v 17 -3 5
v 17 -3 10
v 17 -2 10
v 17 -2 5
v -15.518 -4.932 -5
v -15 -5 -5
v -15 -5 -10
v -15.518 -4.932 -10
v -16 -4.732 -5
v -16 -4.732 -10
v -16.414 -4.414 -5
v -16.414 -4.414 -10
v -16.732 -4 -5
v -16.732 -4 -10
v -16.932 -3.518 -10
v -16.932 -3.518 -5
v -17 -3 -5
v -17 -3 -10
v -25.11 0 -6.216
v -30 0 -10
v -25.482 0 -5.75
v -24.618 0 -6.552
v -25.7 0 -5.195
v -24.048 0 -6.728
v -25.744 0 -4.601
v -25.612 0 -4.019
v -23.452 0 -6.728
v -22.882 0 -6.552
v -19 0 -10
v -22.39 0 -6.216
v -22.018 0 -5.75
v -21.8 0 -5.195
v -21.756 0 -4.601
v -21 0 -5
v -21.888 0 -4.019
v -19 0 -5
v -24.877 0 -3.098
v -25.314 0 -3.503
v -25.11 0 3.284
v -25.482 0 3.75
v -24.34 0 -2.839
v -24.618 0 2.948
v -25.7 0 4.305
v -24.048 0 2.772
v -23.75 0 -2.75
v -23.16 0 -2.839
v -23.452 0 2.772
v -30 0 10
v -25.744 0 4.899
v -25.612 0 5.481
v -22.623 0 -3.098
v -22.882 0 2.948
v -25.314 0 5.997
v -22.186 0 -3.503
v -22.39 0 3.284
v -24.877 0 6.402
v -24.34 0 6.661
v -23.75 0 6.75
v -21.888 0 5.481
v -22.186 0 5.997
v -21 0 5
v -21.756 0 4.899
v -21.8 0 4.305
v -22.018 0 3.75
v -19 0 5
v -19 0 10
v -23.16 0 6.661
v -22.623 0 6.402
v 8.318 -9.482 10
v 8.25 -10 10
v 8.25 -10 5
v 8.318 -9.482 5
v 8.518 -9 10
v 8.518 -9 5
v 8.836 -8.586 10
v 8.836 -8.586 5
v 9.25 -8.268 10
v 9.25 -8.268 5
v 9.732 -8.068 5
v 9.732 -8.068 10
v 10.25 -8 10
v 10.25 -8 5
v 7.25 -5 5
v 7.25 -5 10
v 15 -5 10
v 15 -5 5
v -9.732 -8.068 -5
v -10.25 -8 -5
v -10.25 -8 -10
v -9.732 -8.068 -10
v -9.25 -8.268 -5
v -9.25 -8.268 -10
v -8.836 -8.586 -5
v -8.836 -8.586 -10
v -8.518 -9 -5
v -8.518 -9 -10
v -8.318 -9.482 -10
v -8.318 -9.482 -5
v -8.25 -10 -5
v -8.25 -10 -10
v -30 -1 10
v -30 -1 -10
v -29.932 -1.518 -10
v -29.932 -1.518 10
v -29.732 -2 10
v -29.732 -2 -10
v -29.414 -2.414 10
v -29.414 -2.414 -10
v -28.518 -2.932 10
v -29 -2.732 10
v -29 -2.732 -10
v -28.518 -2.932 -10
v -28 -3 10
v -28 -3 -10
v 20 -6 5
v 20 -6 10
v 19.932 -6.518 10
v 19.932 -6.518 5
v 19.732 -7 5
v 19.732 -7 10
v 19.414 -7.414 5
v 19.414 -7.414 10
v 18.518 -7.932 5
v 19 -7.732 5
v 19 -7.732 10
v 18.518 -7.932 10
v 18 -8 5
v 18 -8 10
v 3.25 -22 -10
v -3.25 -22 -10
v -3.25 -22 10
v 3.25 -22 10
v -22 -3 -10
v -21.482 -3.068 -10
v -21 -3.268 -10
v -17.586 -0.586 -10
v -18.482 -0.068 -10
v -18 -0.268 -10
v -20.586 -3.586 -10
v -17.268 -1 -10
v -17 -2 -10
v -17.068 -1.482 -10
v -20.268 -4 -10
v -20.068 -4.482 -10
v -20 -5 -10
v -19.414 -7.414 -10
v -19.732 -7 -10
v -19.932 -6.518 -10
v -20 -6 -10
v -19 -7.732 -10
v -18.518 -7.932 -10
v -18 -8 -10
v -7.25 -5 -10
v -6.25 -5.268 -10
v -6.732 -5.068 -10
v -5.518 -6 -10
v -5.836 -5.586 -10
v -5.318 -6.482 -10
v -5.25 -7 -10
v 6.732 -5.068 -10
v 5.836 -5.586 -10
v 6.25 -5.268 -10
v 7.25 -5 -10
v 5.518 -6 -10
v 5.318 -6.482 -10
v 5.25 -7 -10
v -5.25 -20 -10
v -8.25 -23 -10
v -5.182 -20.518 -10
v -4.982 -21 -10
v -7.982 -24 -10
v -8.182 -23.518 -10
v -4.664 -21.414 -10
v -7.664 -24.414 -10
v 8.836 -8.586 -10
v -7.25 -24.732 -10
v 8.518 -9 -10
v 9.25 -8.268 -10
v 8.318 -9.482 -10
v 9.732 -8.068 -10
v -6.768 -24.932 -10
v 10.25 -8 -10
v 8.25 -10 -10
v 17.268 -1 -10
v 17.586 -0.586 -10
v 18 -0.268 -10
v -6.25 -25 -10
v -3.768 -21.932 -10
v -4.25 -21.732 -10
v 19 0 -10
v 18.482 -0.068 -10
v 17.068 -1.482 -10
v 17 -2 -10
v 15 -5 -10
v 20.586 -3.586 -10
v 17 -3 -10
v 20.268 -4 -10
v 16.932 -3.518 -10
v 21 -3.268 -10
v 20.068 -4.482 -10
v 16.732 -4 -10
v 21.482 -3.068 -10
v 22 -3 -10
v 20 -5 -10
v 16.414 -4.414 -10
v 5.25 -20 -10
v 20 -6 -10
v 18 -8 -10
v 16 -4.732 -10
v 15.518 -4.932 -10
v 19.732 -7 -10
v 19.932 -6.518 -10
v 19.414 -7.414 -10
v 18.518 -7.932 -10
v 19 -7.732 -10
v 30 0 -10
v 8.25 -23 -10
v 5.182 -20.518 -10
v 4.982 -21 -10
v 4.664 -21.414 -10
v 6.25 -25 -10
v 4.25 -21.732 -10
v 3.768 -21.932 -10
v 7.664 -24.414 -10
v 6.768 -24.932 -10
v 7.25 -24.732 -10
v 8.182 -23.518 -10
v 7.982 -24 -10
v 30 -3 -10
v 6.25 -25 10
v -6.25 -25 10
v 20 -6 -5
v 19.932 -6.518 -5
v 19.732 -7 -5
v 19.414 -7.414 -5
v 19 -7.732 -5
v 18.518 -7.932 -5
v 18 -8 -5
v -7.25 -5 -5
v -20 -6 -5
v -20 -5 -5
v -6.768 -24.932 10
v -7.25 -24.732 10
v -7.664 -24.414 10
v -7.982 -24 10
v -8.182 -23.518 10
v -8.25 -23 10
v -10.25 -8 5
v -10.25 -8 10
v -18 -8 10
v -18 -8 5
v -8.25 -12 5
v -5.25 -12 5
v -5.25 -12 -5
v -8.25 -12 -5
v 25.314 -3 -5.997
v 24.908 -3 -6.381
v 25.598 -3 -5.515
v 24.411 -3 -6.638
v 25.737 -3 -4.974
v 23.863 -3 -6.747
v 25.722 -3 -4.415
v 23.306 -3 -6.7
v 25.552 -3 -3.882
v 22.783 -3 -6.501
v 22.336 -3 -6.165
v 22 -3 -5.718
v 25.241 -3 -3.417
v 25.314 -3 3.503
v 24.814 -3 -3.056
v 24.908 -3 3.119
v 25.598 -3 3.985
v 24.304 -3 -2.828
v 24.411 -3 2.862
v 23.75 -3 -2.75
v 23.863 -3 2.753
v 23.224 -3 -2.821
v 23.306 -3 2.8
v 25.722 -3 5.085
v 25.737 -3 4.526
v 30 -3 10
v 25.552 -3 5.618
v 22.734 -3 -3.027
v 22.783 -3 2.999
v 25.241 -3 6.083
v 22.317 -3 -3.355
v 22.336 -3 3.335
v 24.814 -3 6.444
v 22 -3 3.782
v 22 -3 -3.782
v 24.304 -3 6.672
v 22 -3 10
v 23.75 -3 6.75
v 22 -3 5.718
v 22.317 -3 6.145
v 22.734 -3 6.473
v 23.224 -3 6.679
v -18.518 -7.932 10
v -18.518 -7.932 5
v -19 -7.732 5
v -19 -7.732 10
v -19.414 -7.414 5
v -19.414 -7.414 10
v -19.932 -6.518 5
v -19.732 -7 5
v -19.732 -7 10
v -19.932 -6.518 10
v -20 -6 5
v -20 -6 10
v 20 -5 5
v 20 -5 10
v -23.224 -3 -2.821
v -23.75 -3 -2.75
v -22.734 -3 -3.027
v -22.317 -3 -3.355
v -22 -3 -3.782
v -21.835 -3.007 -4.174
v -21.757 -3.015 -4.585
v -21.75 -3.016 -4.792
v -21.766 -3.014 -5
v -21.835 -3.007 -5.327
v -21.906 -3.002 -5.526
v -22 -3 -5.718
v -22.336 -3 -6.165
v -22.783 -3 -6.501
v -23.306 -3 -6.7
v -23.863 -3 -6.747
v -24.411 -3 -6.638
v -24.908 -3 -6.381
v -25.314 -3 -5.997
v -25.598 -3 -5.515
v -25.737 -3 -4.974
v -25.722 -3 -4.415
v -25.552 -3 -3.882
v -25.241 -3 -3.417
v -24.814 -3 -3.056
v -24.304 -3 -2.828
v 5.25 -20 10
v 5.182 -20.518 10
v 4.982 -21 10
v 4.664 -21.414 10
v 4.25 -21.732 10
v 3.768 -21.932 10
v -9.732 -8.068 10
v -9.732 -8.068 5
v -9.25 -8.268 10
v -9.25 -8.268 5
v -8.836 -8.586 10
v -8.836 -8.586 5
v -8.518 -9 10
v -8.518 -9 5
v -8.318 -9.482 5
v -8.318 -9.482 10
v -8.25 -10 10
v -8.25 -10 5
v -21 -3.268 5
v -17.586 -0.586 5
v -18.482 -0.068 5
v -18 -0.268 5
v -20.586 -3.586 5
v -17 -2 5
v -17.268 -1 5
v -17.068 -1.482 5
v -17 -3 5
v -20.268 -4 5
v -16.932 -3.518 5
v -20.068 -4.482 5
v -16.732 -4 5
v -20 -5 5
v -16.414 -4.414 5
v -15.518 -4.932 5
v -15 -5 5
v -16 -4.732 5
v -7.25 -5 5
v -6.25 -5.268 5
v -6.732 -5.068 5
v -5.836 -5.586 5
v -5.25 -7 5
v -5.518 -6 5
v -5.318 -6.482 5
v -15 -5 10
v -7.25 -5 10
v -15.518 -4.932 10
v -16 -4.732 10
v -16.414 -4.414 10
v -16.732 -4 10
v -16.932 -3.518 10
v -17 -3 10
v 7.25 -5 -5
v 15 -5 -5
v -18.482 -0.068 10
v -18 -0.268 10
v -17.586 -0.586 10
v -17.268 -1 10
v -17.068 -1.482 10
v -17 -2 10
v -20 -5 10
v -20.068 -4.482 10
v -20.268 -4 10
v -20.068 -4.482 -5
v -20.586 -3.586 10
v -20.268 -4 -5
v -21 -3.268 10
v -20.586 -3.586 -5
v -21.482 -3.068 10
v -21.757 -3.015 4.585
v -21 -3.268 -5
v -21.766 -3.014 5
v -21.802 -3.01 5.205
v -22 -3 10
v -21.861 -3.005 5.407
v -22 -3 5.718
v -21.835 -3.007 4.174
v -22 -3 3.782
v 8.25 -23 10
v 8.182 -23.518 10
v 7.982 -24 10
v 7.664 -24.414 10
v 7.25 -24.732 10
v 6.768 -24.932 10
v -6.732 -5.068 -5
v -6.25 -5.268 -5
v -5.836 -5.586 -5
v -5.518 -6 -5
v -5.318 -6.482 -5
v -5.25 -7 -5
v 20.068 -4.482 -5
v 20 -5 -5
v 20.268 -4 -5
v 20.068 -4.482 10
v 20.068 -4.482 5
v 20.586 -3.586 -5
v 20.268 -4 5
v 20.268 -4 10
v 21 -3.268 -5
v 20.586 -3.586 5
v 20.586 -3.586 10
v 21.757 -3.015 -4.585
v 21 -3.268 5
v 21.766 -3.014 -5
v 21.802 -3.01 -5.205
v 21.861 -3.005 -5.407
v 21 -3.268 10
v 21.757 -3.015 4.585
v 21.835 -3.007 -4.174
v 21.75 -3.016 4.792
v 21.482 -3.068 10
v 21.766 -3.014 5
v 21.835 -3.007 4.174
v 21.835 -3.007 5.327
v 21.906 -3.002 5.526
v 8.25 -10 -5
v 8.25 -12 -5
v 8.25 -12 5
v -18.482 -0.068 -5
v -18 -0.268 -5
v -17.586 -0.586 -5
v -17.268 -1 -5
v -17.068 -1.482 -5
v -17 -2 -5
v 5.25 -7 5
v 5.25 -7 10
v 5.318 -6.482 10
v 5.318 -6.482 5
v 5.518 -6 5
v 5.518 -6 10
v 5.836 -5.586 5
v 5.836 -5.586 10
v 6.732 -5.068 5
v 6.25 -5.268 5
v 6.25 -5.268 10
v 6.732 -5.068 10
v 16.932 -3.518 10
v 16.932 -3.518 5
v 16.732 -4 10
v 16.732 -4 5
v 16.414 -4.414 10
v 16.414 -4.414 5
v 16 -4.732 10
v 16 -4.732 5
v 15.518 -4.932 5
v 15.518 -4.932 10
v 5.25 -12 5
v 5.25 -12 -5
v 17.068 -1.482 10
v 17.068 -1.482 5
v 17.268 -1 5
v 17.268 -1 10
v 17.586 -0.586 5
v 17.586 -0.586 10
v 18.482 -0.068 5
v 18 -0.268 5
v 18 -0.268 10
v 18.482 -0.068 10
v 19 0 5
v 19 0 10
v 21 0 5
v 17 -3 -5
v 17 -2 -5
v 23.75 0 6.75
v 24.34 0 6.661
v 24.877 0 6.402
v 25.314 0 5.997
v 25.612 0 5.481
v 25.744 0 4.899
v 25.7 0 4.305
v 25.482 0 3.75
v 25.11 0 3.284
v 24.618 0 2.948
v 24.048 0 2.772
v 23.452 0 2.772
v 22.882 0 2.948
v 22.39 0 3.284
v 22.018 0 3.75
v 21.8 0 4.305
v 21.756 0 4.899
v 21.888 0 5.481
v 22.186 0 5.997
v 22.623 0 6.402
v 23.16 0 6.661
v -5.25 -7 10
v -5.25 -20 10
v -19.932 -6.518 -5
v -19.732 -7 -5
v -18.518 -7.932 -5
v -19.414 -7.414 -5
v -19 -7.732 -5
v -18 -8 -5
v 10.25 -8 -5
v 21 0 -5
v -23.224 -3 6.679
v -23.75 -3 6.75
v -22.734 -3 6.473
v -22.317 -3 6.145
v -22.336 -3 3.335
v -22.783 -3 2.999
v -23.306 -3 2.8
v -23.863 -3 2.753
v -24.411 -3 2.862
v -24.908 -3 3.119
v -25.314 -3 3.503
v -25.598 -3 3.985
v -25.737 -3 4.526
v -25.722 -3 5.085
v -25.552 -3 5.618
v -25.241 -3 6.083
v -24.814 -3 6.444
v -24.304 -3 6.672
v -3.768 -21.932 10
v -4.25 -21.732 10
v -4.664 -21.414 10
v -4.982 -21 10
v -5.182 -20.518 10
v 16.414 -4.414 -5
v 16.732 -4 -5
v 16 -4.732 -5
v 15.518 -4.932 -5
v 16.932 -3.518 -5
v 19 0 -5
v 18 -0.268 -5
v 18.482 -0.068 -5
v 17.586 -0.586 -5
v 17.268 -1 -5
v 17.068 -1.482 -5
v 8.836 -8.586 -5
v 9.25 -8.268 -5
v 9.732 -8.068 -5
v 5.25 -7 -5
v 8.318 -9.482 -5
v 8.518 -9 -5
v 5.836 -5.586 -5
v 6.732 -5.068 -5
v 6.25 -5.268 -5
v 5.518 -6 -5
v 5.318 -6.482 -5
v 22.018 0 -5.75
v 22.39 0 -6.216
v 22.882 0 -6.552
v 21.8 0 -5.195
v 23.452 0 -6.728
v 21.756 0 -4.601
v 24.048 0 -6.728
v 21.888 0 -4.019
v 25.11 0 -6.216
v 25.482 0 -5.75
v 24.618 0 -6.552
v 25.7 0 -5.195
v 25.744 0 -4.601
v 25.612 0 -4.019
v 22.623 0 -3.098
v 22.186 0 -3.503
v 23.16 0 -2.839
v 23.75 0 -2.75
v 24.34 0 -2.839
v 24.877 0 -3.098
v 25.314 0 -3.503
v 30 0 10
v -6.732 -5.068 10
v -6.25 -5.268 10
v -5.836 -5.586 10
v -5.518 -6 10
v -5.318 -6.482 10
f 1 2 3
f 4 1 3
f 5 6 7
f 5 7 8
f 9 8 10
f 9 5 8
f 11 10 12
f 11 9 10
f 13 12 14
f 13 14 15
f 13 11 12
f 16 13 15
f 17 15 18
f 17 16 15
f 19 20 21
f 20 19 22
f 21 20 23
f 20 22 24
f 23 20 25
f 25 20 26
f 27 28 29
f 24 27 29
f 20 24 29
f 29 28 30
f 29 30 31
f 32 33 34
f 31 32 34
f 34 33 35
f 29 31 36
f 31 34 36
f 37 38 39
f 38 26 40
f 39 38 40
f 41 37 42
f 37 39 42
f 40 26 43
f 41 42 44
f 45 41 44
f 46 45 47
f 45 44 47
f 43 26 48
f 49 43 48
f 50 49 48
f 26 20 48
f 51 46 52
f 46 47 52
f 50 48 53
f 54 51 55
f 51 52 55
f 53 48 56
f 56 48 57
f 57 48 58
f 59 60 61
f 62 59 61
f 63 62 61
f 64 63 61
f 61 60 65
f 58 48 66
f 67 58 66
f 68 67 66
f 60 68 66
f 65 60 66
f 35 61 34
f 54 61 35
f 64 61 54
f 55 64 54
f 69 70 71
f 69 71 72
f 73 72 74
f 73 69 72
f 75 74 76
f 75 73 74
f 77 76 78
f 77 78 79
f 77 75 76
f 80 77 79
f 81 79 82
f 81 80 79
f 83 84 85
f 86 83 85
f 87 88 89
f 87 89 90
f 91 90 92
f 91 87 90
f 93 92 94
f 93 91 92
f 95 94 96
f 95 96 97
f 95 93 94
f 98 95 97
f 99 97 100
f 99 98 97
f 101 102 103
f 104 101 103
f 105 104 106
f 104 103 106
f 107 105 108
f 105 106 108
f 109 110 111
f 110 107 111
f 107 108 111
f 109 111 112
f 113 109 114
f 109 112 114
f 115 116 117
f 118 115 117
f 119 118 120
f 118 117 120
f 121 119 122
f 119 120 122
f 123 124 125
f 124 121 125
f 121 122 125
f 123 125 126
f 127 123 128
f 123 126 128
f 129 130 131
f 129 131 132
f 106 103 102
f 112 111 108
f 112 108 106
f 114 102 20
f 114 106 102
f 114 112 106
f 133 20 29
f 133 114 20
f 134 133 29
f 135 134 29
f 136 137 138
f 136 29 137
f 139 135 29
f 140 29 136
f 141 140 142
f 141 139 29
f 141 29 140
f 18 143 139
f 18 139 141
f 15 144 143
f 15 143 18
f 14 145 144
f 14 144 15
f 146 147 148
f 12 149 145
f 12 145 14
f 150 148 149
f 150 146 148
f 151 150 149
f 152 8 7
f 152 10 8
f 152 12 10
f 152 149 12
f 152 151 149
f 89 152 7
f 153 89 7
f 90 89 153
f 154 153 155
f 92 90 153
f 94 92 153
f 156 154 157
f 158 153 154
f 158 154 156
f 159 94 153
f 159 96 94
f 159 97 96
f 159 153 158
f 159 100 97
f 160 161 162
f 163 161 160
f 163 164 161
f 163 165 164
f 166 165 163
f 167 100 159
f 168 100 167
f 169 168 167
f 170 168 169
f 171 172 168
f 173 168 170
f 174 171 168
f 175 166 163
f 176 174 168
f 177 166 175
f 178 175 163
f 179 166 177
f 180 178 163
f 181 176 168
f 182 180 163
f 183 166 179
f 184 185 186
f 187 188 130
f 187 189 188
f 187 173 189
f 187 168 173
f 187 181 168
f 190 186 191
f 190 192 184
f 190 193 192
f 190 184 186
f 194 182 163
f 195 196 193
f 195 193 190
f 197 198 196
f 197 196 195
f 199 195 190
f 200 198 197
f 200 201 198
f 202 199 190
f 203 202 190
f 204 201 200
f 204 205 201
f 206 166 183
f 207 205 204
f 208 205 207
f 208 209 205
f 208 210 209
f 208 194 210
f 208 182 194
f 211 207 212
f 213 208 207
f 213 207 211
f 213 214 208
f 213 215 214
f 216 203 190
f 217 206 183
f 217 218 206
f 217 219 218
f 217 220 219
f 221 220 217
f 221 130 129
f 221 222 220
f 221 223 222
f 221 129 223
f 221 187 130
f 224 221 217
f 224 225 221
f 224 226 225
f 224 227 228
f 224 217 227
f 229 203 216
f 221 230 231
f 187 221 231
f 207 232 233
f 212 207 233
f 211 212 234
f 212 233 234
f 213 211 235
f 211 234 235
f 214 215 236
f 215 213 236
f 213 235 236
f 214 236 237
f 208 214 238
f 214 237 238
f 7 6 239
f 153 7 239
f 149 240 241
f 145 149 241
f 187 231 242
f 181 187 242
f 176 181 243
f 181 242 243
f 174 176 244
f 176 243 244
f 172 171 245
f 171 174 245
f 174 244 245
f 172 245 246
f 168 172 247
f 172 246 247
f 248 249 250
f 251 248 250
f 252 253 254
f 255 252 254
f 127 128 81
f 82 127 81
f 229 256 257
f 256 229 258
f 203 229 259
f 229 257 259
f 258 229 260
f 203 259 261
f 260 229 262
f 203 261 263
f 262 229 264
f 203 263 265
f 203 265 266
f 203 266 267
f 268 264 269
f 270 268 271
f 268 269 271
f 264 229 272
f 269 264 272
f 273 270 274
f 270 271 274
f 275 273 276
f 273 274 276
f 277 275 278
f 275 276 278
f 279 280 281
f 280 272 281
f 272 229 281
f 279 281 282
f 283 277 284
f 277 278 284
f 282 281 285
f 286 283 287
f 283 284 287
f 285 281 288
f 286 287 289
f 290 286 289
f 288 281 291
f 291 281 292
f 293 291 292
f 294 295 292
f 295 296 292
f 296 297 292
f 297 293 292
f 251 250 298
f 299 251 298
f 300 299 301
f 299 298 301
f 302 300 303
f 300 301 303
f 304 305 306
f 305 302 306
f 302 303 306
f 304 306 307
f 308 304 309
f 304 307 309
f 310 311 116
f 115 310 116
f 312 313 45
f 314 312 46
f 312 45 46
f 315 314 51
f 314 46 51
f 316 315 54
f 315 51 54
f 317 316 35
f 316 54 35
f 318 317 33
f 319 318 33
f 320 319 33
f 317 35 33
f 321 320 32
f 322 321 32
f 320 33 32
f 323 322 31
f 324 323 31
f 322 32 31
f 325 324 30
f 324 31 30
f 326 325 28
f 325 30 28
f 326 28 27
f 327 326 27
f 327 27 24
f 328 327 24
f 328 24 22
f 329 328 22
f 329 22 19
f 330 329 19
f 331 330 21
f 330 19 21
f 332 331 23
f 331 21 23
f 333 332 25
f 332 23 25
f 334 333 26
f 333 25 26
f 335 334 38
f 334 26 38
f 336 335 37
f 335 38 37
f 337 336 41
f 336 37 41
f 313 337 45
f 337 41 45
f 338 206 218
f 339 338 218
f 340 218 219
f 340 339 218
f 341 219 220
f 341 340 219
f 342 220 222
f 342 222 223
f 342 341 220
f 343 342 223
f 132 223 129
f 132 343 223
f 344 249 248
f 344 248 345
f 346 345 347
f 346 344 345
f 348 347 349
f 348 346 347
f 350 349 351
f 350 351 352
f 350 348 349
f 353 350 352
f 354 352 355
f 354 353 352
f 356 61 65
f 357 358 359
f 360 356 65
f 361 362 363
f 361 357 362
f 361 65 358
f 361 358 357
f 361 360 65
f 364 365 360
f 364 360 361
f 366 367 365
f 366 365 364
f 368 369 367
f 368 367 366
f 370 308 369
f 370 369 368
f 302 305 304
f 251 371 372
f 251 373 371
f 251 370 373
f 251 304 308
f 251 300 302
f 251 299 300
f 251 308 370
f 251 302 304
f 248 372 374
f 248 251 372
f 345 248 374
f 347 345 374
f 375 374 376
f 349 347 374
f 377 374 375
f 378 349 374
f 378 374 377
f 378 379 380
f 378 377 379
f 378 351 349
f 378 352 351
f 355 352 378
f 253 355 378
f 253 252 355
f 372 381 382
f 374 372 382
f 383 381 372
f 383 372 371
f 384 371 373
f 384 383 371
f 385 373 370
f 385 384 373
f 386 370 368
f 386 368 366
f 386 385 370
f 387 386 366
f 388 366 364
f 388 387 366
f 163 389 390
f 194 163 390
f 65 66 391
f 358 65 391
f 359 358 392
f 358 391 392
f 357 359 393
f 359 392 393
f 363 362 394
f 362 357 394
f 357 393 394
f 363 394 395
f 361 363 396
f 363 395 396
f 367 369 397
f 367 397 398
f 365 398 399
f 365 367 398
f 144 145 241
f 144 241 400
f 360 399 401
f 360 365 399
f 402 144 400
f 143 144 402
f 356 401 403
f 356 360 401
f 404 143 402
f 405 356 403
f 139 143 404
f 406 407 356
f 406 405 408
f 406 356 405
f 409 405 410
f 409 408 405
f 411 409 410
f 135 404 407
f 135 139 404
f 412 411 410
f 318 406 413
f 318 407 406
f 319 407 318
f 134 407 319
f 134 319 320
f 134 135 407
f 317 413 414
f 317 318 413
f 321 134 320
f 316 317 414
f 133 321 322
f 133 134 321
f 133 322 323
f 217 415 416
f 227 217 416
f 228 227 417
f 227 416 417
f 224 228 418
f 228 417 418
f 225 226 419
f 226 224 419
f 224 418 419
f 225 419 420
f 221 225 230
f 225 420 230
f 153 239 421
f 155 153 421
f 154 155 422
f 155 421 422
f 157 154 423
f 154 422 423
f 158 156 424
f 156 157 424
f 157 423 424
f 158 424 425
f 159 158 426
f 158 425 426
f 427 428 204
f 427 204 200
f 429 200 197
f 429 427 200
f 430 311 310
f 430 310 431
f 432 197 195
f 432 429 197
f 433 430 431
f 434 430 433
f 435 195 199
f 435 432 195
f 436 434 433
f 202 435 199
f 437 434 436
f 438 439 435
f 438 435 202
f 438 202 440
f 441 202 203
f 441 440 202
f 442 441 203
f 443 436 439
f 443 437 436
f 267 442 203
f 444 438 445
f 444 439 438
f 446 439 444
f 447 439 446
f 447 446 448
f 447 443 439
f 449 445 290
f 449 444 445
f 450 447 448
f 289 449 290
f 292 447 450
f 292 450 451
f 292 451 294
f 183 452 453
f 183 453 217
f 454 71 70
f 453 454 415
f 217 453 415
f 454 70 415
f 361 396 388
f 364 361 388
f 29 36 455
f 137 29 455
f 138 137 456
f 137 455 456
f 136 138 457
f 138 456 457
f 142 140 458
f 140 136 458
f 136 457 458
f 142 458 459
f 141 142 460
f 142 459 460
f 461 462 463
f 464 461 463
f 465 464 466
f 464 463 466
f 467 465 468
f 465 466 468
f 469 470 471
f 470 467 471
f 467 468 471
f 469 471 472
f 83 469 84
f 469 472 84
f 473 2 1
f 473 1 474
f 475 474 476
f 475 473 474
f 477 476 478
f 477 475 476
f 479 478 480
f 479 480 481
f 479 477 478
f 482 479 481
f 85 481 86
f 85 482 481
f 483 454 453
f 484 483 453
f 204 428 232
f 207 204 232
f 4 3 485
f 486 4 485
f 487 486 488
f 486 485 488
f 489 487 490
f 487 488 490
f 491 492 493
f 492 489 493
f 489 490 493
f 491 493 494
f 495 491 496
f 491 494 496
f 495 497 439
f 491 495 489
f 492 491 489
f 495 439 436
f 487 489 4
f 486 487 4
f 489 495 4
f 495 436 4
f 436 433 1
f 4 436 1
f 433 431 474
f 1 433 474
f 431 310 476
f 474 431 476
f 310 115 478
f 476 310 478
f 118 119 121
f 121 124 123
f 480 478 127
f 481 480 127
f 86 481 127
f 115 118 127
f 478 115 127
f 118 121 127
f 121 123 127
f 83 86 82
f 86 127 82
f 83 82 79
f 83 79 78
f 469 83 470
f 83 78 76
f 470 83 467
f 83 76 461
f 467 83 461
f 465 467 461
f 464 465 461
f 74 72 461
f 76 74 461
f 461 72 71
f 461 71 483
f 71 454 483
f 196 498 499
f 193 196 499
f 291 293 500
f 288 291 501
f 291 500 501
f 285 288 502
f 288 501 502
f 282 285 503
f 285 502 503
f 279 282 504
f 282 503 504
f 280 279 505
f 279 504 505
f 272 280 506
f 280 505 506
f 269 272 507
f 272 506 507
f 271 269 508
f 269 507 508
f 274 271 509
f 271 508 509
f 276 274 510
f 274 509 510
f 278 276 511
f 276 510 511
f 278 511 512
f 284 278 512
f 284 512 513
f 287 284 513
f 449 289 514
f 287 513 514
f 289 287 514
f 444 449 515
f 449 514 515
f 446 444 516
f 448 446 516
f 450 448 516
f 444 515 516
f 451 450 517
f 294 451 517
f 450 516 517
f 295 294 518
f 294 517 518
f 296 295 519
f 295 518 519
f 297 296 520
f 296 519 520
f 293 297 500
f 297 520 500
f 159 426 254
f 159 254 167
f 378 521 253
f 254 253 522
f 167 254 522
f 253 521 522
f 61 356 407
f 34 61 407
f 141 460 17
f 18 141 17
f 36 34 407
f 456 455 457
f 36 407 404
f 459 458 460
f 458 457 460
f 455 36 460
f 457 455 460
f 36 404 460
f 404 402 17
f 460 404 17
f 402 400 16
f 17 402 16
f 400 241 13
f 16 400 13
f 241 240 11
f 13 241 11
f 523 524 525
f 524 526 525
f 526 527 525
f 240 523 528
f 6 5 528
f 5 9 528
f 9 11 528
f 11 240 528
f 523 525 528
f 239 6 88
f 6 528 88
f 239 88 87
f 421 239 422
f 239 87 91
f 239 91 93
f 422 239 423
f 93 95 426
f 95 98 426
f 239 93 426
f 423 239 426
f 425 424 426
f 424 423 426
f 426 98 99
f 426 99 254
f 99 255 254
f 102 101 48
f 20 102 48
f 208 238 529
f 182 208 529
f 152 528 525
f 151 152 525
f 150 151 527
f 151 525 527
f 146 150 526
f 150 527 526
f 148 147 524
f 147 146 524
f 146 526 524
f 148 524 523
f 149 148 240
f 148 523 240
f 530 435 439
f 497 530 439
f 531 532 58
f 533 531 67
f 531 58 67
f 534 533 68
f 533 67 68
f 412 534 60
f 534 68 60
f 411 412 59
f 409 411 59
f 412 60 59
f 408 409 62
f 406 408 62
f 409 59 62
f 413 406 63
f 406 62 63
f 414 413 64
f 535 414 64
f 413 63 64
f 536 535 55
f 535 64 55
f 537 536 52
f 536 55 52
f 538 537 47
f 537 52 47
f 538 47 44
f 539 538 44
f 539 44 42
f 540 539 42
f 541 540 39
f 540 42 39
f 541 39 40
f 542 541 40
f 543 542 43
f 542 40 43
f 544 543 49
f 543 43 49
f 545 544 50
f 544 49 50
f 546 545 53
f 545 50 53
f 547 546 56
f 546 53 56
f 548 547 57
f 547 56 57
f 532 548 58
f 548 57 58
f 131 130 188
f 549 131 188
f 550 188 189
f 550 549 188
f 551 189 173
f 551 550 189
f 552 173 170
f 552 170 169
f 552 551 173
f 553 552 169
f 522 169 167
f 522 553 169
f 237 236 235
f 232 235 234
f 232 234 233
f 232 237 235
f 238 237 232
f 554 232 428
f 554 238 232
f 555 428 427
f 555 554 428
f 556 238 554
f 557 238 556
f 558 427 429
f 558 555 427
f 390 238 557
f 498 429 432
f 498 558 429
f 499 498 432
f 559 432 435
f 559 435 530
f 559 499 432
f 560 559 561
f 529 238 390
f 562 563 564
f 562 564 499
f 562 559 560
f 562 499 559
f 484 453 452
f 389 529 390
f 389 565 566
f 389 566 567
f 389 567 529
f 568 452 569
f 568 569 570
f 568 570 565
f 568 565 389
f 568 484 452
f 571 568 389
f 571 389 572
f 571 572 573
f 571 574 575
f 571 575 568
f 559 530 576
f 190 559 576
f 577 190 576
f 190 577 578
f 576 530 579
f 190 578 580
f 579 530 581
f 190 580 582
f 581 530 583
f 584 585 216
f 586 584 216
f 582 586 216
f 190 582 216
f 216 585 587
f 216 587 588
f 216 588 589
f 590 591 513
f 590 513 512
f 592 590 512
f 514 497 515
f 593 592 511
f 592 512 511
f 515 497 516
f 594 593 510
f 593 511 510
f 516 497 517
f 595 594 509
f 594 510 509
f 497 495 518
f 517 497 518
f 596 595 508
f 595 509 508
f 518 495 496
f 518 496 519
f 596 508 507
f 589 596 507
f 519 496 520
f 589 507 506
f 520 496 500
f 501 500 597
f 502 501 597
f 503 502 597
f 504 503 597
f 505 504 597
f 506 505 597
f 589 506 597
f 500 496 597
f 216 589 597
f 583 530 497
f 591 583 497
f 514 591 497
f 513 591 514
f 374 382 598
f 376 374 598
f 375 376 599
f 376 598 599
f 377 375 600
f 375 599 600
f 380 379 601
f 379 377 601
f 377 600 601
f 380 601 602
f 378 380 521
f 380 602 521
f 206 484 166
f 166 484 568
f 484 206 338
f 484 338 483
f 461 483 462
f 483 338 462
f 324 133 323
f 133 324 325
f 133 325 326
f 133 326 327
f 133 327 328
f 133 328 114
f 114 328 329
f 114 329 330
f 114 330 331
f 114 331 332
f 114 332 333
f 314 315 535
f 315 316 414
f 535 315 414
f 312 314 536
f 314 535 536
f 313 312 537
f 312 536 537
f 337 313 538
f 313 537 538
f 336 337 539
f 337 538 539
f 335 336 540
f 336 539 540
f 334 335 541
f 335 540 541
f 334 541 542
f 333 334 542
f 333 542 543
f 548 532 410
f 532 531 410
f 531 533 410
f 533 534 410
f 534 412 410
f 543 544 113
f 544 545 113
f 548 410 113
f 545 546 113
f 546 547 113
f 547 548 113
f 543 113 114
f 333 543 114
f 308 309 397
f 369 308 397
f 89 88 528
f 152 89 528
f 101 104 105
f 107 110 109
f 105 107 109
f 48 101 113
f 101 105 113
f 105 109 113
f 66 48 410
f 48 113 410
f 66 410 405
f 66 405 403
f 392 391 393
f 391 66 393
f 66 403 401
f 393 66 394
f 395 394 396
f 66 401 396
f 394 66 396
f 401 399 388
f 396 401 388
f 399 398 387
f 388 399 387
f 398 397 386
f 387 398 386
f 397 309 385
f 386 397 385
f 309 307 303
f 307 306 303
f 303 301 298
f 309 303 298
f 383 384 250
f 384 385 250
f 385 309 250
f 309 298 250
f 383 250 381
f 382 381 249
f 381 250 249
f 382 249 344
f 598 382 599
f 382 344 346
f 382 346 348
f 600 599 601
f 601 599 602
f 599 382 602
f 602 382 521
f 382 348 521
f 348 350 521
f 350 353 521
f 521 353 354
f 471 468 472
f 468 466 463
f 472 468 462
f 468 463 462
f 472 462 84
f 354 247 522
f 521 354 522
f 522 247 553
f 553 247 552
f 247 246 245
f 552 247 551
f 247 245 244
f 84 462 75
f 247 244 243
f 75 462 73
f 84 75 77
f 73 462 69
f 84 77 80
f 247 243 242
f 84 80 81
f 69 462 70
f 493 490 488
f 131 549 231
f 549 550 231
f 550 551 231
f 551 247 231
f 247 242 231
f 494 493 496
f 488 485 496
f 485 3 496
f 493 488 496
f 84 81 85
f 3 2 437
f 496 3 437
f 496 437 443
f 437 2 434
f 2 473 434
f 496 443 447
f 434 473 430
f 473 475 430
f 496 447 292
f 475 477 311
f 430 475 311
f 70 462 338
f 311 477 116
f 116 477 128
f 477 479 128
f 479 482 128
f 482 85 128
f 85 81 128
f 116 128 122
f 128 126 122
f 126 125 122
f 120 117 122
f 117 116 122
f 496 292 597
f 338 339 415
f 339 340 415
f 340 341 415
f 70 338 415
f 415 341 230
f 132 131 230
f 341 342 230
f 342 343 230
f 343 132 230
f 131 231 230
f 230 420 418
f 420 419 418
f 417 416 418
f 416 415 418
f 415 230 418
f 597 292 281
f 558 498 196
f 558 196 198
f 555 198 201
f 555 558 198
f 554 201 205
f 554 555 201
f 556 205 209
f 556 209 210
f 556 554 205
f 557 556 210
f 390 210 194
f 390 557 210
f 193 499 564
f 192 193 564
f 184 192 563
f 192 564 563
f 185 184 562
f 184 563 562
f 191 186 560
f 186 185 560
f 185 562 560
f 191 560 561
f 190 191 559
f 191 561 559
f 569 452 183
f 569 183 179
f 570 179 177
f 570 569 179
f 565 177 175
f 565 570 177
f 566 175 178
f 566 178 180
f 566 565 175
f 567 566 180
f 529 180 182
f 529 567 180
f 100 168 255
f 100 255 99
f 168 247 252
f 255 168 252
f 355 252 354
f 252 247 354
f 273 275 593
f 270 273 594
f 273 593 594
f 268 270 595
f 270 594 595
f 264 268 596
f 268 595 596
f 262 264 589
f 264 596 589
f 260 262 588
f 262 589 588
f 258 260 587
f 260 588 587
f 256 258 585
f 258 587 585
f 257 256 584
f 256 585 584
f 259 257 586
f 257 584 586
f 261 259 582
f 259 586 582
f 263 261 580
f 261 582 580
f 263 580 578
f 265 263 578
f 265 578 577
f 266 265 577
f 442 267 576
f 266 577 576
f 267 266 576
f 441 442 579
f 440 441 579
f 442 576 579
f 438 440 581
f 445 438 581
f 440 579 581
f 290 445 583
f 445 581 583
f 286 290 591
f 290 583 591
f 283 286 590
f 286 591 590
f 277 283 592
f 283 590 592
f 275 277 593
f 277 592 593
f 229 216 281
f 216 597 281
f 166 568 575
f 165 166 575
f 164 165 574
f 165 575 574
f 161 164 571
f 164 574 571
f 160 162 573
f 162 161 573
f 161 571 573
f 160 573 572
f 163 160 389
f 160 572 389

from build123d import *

# Parameters (mm, degrees)
BOSS_EXTRUDE1_DEPTH = 10
SKETCH2_R           = 2
CUT_EXTRUDE1_DEPTH  = 6
SKETCH3_W           = 10
SKETCH3_H           = 12
CUT_EXTRUDE2_DEPTH  = 21
FILLET1_R           = 2


with BuildPart() as part:
    # Sketch1 → Boss-Extrude1 (new, symmetric)
    with BuildSketch(Plane.XY):
        Polygon((-30, 0), (-17, 0), (-17, -5), (-5.25, -5), (-5.25, -22), (5.25, -22), (5.25, -5), (17, -5), (17, 0), (30, 0), (30, -3), (20, -3), (20, -8), (8.25, -8), (8.25, -25), (-8.25, -25), (-8.25, -8), (-20, -8), (-20, -3), (-30, -3), align=None)
    extrude(amount=BOSS_EXTRUDE1_DEPTH, both=True)

    # Sketch2 → Cut-Extrude1 (cut)
    with BuildSketch(Plane(origin=(0, 0, 0), x_dir=(1, 0, 0), z_dir=(0, 1, 0))):
        with Locations(Location((-23.75, 4.75, 0), (0, 0, 270))):
            Circle(SKETCH2_R)
        with Locations(Location((-23.75, -4.75, 0), (0, 0, 270))):
            Circle(SKETCH2_R)
        with Locations(Location((23.75, 4.75, 0), (0, 0, 270))):
            Circle(SKETCH2_R)
        with Locations(Location((23.75, -4.75, 0), (0, 0, 270))):
            Circle(SKETCH2_R)
    extrude(amount=-CUT_EXTRUDE1_DEPTH, mode=Mode.SUBTRACT)

    # Sketch3 → Cut-Extrude2 (cut, symmetric)
    with BuildSketch(Plane(origin=(0, 0, 0), x_dir=(0, 0, -1), z_dir=(1, 0, 0))):
        with Locations((0, -6)):
            Rectangle(SKETCH3_W, SKETCH3_H)
    extrude(amount=CUT_EXTRUDE2_DEPTH, both=True, mode=Mode.SUBTRACT)

    # Fillet1
    # the kernel refuses this fillet: 2 mm, written as the material it adds along each edge
    with BuildSketch(Plane(origin=(-17, -5, 10), x_dir=(0, 1, 0), z_dir=(0, 0, -1)), Plane(origin=(17, -5, 10), x_dir=(-1, 0, 0), z_dir=(0, 0, -1)), Plane(origin=(8.25, -8, 10), x_dir=(1, 0, 0), z_dir=(0, 0, -1)), Plane(origin=(-8.25, -8, 10), x_dir=(0, -1, 0), z_dir=(0, 0, -1)), Plane(origin=(-17, -5, -5), x_dir=(0, 1, 0), z_dir=(0, 0, -1)), Plane(origin=(17, -5, -5), x_dir=(-1, 0, 0), z_dir=(0, 0, -1)), Plane(origin=(-8.25, -8, -5), x_dir=(0, -1, 0), z_dir=(0, 0, -1))) as fillet1_piece_1:
        with BuildLine():
            CenterArc((FILLET1_R, FILLET1_R), FILLET1_R, 180, 90)
            Line((0, FILLET1_R), (0, 0))
            Line((0, 0), (FILLET1_R, 0))
        make_face()
    extrude(amount=5)
    with BuildSketch(Plane(origin=(-5.25, -22, 10), x_dir=(0, 1, 0), z_dir=(0, 0, -1)), Plane(origin=(5.25, -22, 10), x_dir=(-1, 0, 0), z_dir=(0, 0, -1))) as fillet1_piece_2:
        with BuildLine():
            CenterArc((FILLET1_R, FILLET1_R), FILLET1_R, 180, 90)
            Line((0, FILLET1_R), (0, 0))
            Line((0, 0), (FILLET1_R, 0))
        make_face()
    extrude(amount=20)
    with BuildSketch(Plane(origin=(20, -3, 10), x_dir=(1, 0, 0), z_dir=(0, 0, -1))) as fillet1_piece_3_section:
        with BuildLine():
            CenterArc((FILLET1_R, FILLET1_R), FILLET1_R, 180, 90)
            Line((0, FILLET1_R), (0, 0))
            Line((0, 0), (FILLET1_R, 0))
        make_face()
    fillet1_piece_3 = extrude(amount=5, mode=Mode.PRIVATE)
    fillet1_piece_3 = split(fillet1_piece_3, bisect_by=Plane(origin=(21, -3.048479196, 7.515597856), z_dir=(1, 0, 0)), keep=Keep.TOP, mode=Mode.PRIVATE)
    fillet1_piece_3 = fillet1_piece_3 - Plane(origin=(23.75, -3.048479196, 4.75), x_dir=(0, 0, 1), z_dir=(0, 1, 0)) * Cylinder(2, 18, mode=Mode.PRIVATE)
    add(fillet1_piece_3)
    with BuildSketch(Plane(origin=(20, -3, 10), x_dir=(1, 0, 0), z_dir=(0, 0, -1))) as fillet1_piece_4_section:
        with BuildLine():
            CenterArc((FILLET1_R, FILLET1_R), FILLET1_R, 180, 90)
            Line((0, FILLET1_R), (0, 0))
            Line((0, 0), (FILLET1_R, 0))
        make_face()
    fillet1_piece_4 = extrude(amount=5, mode=Mode.PRIVATE)
    fillet1_piece_4 = split(fillet1_piece_4, bisect_by=Plane(origin=(21, -3.51024012, 7.5), z_dir=(-1, 0, 0)), keep=Keep.TOP, mode=Mode.PRIVATE)
    add(fillet1_piece_4)
    with BuildSketch(Plane(origin=(20, -3, 10), x_dir=(1, 0, 0), z_dir=(0, 0, -1))) as fillet1_piece_5_section:
        with BuildLine():
            CenterArc((FILLET1_R, FILLET1_R), FILLET1_R, 180, 90)
            Line((0, FILLET1_R), (0, 0))
            Line((0, 0), (FILLET1_R, 0))
        make_face()
    fillet1_piece_5 = extrude(amount=10, mode=Mode.PRIVATE)
    fillet1_piece_5 = split(fillet1_piece_5, bisect_by=Plane(origin=(21.317615257, -3.049059645, 5), z_dir=(0, 0, -1)), keep=Keep.TOP, mode=Mode.PRIVATE)
    fillet1_piece_5 = split(fillet1_piece_5, bisect_by=Plane(origin=(21, -3.049059645, 2.467907611), z_dir=(1, 0, 0)), keep=Keep.TOP, mode=Mode.PRIVATE)
    fillet1_piece_5 = fillet1_piece_5 - Plane(origin=(23.75, -3.049059645, 4.75), x_dir=(0, 0, 1), z_dir=(0, 1, 0)) * Cylinder(2, 28, mode=Mode.PRIVATE)
    add(fillet1_piece_5)
    with BuildSketch(Plane(origin=(-20, -3, 0), x_dir=(-1, 0, 0), z_dir=(0, 0, 1))) as fillet1_piece_6_section:
        with BuildLine():
            CenterArc((FILLET1_R, FILLET1_R), FILLET1_R, 180, 90)
            Line((0, FILLET1_R), (0, 0))
            Line((0, 0), (FILLET1_R, 0))
        make_face()
    fillet1_piece_6 = extrude(amount=10, mode=Mode.PRIVATE)
    fillet1_piece_6 = split(fillet1_piece_6, bisect_by=Plane(origin=(-21.317615257, -3.049059645, 5), z_dir=(0, 0, -1)), keep=Keep.TOP, mode=Mode.PRIVATE)
    fillet1_piece_6 = split(fillet1_piece_6, bisect_by=Plane(origin=(-21, -3.049059645, 2.46790761), z_dir=(-1, 0, 0)), keep=Keep.TOP, mode=Mode.PRIVATE)
    fillet1_piece_6 = fillet1_piece_6 - Plane(origin=(-23.75, -3.049059645, 4.75), x_dir=(0, 0, 1), z_dir=(0, 1, 0)) * Cylinder(2, 28, mode=Mode.PRIVATE)
    add(fillet1_piece_6)
    with BuildSketch(Plane(origin=(-20, -3, 5), x_dir=(-1, 0, 0), z_dir=(0, 0, 1))) as fillet1_piece_7_section:
        with BuildLine():
            CenterArc((FILLET1_R, FILLET1_R), FILLET1_R, 180, 90)
            Line((0, FILLET1_R), (0, 0))
            Line((0, 0), (FILLET1_R, 0))
        make_face()
    fillet1_piece_7 = extrude(amount=5, mode=Mode.PRIVATE)
    fillet1_piece_7 = split(fillet1_piece_7, bisect_by=Plane(origin=(-21, -3.048479196, 7.515597855), z_dir=(-1, 0, 0)), keep=Keep.TOP, mode=Mode.PRIVATE)
    fillet1_piece_7 = fillet1_piece_7 - Plane(origin=(-23.75, -3.048479196, 4.75), x_dir=(0, 0, 1), z_dir=(0, 1, 0)) * Cylinder(2, 18, mode=Mode.PRIVATE)
    add(fillet1_piece_7)
    with BuildSketch(Plane(origin=(-20, -3, 5), x_dir=(-1, 0, 0), z_dir=(0, 0, 1))) as fillet1_piece_8_section:
        with BuildLine():
            CenterArc((FILLET1_R, FILLET1_R), FILLET1_R, 180, 90)
            Line((0, FILLET1_R), (0, 0))
            Line((0, 0), (FILLET1_R, 0))
        make_face()
    fillet1_piece_8 = extrude(amount=5, mode=Mode.PRIVATE)
    fillet1_piece_8 = split(fillet1_piece_8, bisect_by=Plane(origin=(-21, -3.51024012, 7.5), z_dir=(1, 0, 0)), keep=Keep.TOP, mode=Mode.PRIVATE)
    add(fillet1_piece_8)
    with BuildSketch(Plane(origin=(20, -3, 0), x_dir=(1, 0, 0), z_dir=(0, 0, -1))) as fillet1_piece_9_section:
        with BuildLine():
            CenterArc((FILLET1_R, FILLET1_R), FILLET1_R, 180, 90)
            Line((0, FILLET1_R), (0, 0))
            Line((0, 0), (FILLET1_R, 0))
        make_face()
    fillet1_piece_9 = extrude(amount=10, mode=Mode.PRIVATE)
    fillet1_piece_9 = split(fillet1_piece_9, bisect_by=Plane(origin=(21, -3.049059645, -2.46790761), z_dir=(1, 0, 0)), keep=Keep.TOP, mode=Mode.PRIVATE)
    fillet1_piece_9 = split(fillet1_piece_9, bisect_by=Plane(origin=(21.317615257, -3.049059645, -5), z_dir=(0, 0, 1)), keep=Keep.TOP, mode=Mode.PRIVATE)
    fillet1_piece_9 = fillet1_piece_9 - Plane(origin=(23.75, -3.049059645, -4.75), x_dir=(0, 0, 1), z_dir=(0, 1, 0)) * Cylinder(2, 28, mode=Mode.PRIVATE)
    add(fillet1_piece_9)
    with BuildSketch(Plane(origin=(20, -3, -5), x_dir=(1, 0, 0), z_dir=(0, 0, -1))) as fillet1_piece_10_section:
        with BuildLine():
            CenterArc((FILLET1_R, FILLET1_R), FILLET1_R, 180, 90)
            Line((0, FILLET1_R), (0, 0))
            Line((0, 0), (FILLET1_R, 0))
        make_face()
    fillet1_piece_10 = extrude(amount=5, mode=Mode.PRIVATE)
    fillet1_piece_10 = split(fillet1_piece_10, bisect_by=Plane(origin=(21, -3.048479196, -7.515597854), z_dir=(1, 0, 0)), keep=Keep.TOP, mode=Mode.PRIVATE)
    fillet1_piece_10 = fillet1_piece_10 - Plane(origin=(23.75, -3.048479196, -4.75), x_dir=(0, 0, 1), z_dir=(0, 1, 0)) * Cylinder(2, 18, mode=Mode.PRIVATE)
    add(fillet1_piece_10)
    with BuildSketch(Plane(origin=(20, -3, -5), x_dir=(1, 0, 0), z_dir=(0, 0, -1))) as fillet1_piece_11_section:
        with BuildLine():
            CenterArc((FILLET1_R, FILLET1_R), FILLET1_R, 180, 90)
            Line((0, FILLET1_R), (0, 0))
            Line((0, 0), (FILLET1_R, 0))
        make_face()
    fillet1_piece_11 = extrude(amount=5, mode=Mode.PRIVATE)
    fillet1_piece_11 = split(fillet1_piece_11, bisect_by=Plane(origin=(21, -3.51024012, -7.5), z_dir=(-1, 0, 0)), keep=Keep.TOP, mode=Mode.PRIVATE)
    add(fillet1_piece_11)
    with BuildSketch(Plane(origin=(8.25, -8, -5), x_dir=(0, -1, 0), z_dir=(0, 0, -1))) as fillet1_piece_12:
        with BuildLine():
            CenterArc((FILLET1_R, -FILLET1_R), FILLET1_R, 90, 90)
            Line((0, -FILLET1_R), (0, 0))
            Line((0, 0), (FILLET1_R, 0))
        make_face()
    extrude(amount=5)
    with BuildSketch(Plane(origin=(-20, -3, -10), x_dir=(-1, 0, 0), z_dir=(0, 0, 1))) as fillet1_piece_13_section:
        with BuildLine():
            CenterArc((FILLET1_R, FILLET1_R), FILLET1_R, 180, 90)
            Line((0, FILLET1_R), (0, 0))
            Line((0, 0), (FILLET1_R, 0))
        make_face()
    fillet1_piece_13 = extrude(amount=5, mode=Mode.PRIVATE)
    fillet1_piece_13 = split(fillet1_piece_13, bisect_by=Plane(origin=(-21, -3.048479196, -7.515597855), z_dir=(-1, 0, 0)), keep=Keep.TOP, mode=Mode.PRIVATE)
    fillet1_piece_13 = fillet1_piece_13 - Plane(origin=(-23.75, -3.048479196, -4.75), x_dir=(0, 0, 1), z_dir=(0, 1, 0)) * Cylinder(2, 18, mode=Mode.PRIVATE)
    add(fillet1_piece_13)
    with BuildSketch(Plane(origin=(-20, -3, -10), x_dir=(-1, 0, 0), z_dir=(0, 0, 1))) as fillet1_piece_14_section:
        with BuildLine():
            CenterArc((FILLET1_R, FILLET1_R), FILLET1_R, 180, 90)
            Line((0, FILLET1_R), (0, 0))
            Line((0, 0), (FILLET1_R, 0))
        make_face()
    fillet1_piece_14 = extrude(amount=5, mode=Mode.PRIVATE)
    fillet1_piece_14 = split(fillet1_piece_14, bisect_by=Plane(origin=(-21, -3.51024012, -7.5), z_dir=(1, 0, 0)), keep=Keep.TOP, mode=Mode.PRIVATE)
    add(fillet1_piece_14)
    with BuildSketch(Plane(origin=(-20, -3, -10), x_dir=(-1, 0, 0), z_dir=(0, 0, 1))) as fillet1_piece_15_section:
        with BuildLine():
            CenterArc((FILLET1_R, FILLET1_R), FILLET1_R, 180, 90)
            Line((0, FILLET1_R), (0, 0))
            Line((0, 0), (FILLET1_R, 0))
        make_face()
    fillet1_piece_15 = extrude(amount=10, mode=Mode.PRIVATE)
    fillet1_piece_15 = split(fillet1_piece_15, bisect_by=Plane(origin=(-21, -3.049059645, -2.467907611), z_dir=(-1, 0, 0)), keep=Keep.TOP, mode=Mode.PRIVATE)
    fillet1_piece_15 = split(fillet1_piece_15, bisect_by=Plane(origin=(-21.317615257, -3.049059645, -5), z_dir=(0, 0, 1)), keep=Keep.TOP, mode=Mode.PRIVATE)
    fillet1_piece_15 = fillet1_piece_15 - Plane(origin=(-23.75, -3.049059645, -4.75), x_dir=(0, 0, 1), z_dir=(0, 1, 0)) * Cylinder(2, 28, mode=Mode.PRIVATE)
    add(fillet1_piece_15)
    # the kernel refuses this fillet: 2 mm, written as the material it takes off along each edge
    with BuildSketch(Plane(origin=(-17, 0, 15), x_dir=(-1, 0, 0), z_dir=(0, 0, -1)), Plane(origin=(20, -8, 15), x_dir=(0, 1, 0), z_dir=(0, 0, -1)), Plane(origin=(-20, -8, 15), x_dir=(1, 0, 0), z_dir=(0, 0, -1)), Plane(origin=(-17, 0, 0), x_dir=(-1, 0, 0), z_dir=(0, 0, -1)), Plane(origin=(5.25, -5, 0), x_dir=(0, -1, 0), z_dir=(0, 0, -1))) as fillet1_2_piece_1:
        with BuildLine():
            CenterArc((FILLET1_R, -FILLET1_R), FILLET1_R, 90, 90)
            Line((0, -FILLET1_R), (0, 0))
            Line((0, 0), (FILLET1_R, 0))
        make_face()
    extrude(amount=15, mode=Mode.SUBTRACT)
    with BuildSketch(Plane(origin=(-5.25, -5, 15), x_dir=(0, -1, 0), z_dir=(0, 0, -1)), Plane(origin=(5.25, -5, 15), x_dir=(1, 0, 0), z_dir=(0, 0, -1)), Plane(origin=(17, 0, 15), x_dir=(1, 0, 0), z_dir=(0, 0, -1)), Plane(origin=(-5.25, -5, 0), x_dir=(0, -1, 0), z_dir=(0, 0, -1)), Plane(origin=(17, 0, 0), x_dir=(1, 0, 0), z_dir=(0, 0, -1)), Plane(origin=(20, -8, 0), x_dir=(-1, 0, 0), z_dir=(0, 0, -1)), Plane(origin=(-20, -8, 0), x_dir=(0, 1, 0), z_dir=(0, 0, -1))) as fillet1_2_piece_2:
        with BuildLine():
            CenterArc((FILLET1_R, FILLET1_R), FILLET1_R, 180, 90)
            Line((0, FILLET1_R), (0, 0))
            Line((0, 0), (FILLET1_R, 0))
        make_face()
    extrude(amount=15, mode=Mode.SUBTRACT)
    with BuildSketch(Plane(origin=(8.25, -25, 15), x_dir=(-1, 0, 0), z_dir=(0, 0, -1)), Plane(origin=(-8.25, -25, 15), x_dir=(0, 1, 0), z_dir=(0, 0, -1)), Plane(origin=(-30, -3, -15), x_dir=(1, 0, 0), z_dir=(0, 0, 1))) as fillet1_2_piece_3:
        with BuildLine():
            CenterArc((FILLET1_R, FILLET1_R), FILLET1_R, 180, 90)
            Line((0, FILLET1_R), (0, 0))
            Line((0, 0), (FILLET1_R, 0))
        make_face()
    extrude(amount=30, mode=Mode.SUBTRACT)


solid = part.part
